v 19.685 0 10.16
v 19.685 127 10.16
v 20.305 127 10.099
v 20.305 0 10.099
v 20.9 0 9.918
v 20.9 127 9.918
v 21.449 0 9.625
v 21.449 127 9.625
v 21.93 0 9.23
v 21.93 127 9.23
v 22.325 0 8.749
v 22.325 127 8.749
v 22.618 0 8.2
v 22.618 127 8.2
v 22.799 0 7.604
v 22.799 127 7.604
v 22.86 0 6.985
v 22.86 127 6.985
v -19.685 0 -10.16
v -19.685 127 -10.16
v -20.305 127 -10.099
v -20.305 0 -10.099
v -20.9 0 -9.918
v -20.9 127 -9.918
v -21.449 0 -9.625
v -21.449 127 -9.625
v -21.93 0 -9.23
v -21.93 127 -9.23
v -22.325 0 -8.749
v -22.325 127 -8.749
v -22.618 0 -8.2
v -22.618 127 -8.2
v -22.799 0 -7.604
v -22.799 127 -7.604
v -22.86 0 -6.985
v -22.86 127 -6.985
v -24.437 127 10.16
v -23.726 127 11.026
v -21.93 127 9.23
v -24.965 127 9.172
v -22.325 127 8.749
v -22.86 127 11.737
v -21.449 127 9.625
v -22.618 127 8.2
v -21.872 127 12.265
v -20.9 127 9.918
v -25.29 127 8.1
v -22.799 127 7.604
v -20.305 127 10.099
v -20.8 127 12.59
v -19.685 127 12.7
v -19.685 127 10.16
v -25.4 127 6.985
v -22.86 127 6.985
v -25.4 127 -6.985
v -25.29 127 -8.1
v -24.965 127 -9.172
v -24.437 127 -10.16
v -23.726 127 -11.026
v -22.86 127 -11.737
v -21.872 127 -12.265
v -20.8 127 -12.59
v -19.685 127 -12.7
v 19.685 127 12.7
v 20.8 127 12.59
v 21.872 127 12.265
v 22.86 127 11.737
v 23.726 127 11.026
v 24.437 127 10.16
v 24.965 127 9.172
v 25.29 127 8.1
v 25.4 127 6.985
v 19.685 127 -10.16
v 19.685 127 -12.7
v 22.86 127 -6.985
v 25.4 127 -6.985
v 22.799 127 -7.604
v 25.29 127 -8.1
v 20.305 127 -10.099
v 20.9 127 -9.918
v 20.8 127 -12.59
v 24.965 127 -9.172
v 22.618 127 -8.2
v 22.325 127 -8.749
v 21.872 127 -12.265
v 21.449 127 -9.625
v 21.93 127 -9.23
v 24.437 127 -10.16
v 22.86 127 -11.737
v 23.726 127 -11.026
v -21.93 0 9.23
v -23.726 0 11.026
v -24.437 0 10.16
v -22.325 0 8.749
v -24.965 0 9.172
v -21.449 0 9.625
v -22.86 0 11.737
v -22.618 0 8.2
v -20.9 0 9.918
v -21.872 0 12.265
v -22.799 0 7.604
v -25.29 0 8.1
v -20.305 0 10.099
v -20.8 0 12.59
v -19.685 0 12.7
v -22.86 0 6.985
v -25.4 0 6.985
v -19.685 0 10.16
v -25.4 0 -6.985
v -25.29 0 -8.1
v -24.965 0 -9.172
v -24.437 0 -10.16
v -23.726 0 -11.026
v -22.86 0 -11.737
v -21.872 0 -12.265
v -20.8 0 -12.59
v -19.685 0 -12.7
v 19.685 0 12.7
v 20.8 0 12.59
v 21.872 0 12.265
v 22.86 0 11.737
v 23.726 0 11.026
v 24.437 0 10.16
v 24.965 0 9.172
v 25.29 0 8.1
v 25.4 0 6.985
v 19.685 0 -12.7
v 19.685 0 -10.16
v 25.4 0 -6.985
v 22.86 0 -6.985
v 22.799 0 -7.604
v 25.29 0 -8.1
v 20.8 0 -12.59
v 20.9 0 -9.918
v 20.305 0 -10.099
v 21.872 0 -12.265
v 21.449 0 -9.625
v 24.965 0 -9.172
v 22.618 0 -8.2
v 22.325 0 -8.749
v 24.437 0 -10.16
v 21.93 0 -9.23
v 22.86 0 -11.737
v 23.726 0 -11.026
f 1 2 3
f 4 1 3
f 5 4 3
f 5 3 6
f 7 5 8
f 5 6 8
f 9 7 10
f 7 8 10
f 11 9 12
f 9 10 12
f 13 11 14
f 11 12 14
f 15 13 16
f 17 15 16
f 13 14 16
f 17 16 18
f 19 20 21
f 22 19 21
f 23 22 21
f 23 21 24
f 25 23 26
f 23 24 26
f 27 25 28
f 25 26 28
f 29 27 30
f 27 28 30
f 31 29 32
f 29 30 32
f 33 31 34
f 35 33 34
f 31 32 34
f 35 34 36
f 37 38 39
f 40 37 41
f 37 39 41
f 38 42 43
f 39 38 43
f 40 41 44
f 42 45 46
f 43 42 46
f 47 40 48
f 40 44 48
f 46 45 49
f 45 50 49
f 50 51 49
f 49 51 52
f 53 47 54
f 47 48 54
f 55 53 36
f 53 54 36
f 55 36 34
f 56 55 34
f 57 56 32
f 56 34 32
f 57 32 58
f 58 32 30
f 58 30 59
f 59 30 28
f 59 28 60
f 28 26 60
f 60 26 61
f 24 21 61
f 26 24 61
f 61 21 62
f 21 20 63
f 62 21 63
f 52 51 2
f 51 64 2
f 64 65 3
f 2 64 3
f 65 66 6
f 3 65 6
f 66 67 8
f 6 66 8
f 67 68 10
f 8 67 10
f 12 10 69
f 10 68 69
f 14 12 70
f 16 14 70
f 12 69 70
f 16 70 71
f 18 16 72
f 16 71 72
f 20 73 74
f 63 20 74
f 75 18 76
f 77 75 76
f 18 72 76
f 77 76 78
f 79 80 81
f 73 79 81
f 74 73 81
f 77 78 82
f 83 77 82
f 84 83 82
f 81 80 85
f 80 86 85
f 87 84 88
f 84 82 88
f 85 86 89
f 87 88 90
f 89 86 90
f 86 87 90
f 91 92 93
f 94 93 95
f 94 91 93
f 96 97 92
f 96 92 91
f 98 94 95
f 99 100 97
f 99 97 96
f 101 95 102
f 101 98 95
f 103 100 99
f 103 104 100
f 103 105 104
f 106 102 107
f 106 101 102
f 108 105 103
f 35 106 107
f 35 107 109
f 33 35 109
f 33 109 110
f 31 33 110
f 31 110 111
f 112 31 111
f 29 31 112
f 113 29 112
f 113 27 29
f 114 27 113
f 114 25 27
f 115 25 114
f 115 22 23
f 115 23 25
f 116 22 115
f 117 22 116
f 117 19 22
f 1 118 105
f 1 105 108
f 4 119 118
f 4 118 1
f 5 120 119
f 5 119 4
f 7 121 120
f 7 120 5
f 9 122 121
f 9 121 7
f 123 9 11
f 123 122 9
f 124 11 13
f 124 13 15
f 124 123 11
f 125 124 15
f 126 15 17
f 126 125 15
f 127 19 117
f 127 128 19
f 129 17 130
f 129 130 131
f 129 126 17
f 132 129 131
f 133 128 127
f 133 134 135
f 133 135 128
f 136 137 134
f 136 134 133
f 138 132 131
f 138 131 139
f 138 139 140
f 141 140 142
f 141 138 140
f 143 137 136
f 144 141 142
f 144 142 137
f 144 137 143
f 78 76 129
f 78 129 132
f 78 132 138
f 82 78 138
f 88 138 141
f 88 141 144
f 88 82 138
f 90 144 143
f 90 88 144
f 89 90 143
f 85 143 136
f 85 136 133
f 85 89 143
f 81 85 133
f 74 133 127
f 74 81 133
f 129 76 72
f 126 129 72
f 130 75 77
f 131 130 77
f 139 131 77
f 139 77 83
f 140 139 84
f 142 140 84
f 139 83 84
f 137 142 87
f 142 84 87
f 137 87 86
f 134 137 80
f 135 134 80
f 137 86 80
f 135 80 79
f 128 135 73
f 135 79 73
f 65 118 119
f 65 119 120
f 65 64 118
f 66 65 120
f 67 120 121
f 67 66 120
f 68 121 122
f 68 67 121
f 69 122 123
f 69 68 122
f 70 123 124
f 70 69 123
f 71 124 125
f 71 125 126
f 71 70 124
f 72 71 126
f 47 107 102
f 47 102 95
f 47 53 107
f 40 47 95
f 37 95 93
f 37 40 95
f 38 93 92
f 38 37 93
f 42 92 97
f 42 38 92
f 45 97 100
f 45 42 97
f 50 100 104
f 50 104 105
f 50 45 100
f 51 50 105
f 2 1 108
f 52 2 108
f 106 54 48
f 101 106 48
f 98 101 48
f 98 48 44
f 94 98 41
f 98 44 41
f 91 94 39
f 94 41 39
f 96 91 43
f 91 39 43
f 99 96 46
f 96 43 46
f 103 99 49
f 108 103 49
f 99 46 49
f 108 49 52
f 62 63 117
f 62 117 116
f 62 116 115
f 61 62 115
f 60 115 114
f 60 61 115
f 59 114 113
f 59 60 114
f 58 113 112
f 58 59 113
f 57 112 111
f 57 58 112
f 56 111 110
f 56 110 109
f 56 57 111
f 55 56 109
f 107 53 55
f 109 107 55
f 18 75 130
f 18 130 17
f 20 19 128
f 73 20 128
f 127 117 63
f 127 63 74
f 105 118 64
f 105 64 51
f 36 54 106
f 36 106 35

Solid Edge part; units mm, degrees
sketch "Sketch1" plane through (0, 0, 0) normal (1, 0, 0) x (0, 1, 0)
  line L0 (0, 0) -> (127.0003, 0)
  dimension "D1" = 127.0003
sketch "Sketch2" plane through (0, 0, 0) normal (0, -1, 0) x (1, 0, 0)
  line L0 (25.4001, -6.985) -> (25.4001, 6.985)
  arc A0 (19.6851, 12.7) -> (25.4001, 6.985) centre (19.6851, 6.985) cw
  line L1 (19.6851, 12.7) -> (-19.6851, 12.7)
  arc A1 (-19.6851, 12.7) -> (-25.4001, 6.985) centre (-19.6851, 6.985) ccw
  line L2 (-25.4001, 6.985) -> (-25.4001, -6.985)
  arc A2 (-25.4001, -6.985) -> (-19.6851, -12.7) centre (-19.6851, -6.985) ccw
  line L3 (-19.6851, -12.7) -> (19.6851, -12.7)
  arc A3 (19.6851, -12.7) -> (25.4001, -6.985) centre (19.6851, -6.985) ccw
  dimension "D1" = 50.8001
  dimension "D2" = 25.4001
  dimension "D3" = 5.715
  dimension "D4" = 2.54
sweep "Protrusion_1" add profiles "Sketch2" path "Sketch1"
sketch "Sketch3" plane through (0, 0, 0) normal (1, 0, 0) x (0, 1, 0)
  line L0 (0, 0) -> (127.0003, 0)
  dimension "D1" = 127.0003
sketch "Sketch4" plane through (0, 0, 0) normal (0, -1, 0) x (1, 0, 0)
  line L0 (-19.6851, -10.16) -> (19.6851, -10.16)
  arc A0 (19.6851, -10.16) -> (22.8601, -6.985) centre (19.6851, -6.985) ccw
  line L1 (22.8601, -6.985) -> (22.8601, 6.985)
  arc A1 (22.8601, 6.985) -> (19.6851, 10.16) centre (19.6851, 6.985) ccw
  line L2 (19.6851, 10.16) -> (-19.6851, 10.16)
  arc A2 (-19.6851, 10.16) -> (-22.8601, 6.985) centre (-19.6851, 6.985) ccw
  line L3 (-22.8601, 6.985) -> (-22.8601, -6.985)
  arc A3 (-22.8601, -6.985) -> (-19.6851, -10.16) centre (-19.6851, -6.985) ccw
  dimension "D1" = 50.8001
  dimension "D2" = 25.4001
  dimension "D3" = 5.715
  dimension "D4" = 2.54
sweep "Cutout_1" cut profiles "Sketch4" path "Sketch3"
